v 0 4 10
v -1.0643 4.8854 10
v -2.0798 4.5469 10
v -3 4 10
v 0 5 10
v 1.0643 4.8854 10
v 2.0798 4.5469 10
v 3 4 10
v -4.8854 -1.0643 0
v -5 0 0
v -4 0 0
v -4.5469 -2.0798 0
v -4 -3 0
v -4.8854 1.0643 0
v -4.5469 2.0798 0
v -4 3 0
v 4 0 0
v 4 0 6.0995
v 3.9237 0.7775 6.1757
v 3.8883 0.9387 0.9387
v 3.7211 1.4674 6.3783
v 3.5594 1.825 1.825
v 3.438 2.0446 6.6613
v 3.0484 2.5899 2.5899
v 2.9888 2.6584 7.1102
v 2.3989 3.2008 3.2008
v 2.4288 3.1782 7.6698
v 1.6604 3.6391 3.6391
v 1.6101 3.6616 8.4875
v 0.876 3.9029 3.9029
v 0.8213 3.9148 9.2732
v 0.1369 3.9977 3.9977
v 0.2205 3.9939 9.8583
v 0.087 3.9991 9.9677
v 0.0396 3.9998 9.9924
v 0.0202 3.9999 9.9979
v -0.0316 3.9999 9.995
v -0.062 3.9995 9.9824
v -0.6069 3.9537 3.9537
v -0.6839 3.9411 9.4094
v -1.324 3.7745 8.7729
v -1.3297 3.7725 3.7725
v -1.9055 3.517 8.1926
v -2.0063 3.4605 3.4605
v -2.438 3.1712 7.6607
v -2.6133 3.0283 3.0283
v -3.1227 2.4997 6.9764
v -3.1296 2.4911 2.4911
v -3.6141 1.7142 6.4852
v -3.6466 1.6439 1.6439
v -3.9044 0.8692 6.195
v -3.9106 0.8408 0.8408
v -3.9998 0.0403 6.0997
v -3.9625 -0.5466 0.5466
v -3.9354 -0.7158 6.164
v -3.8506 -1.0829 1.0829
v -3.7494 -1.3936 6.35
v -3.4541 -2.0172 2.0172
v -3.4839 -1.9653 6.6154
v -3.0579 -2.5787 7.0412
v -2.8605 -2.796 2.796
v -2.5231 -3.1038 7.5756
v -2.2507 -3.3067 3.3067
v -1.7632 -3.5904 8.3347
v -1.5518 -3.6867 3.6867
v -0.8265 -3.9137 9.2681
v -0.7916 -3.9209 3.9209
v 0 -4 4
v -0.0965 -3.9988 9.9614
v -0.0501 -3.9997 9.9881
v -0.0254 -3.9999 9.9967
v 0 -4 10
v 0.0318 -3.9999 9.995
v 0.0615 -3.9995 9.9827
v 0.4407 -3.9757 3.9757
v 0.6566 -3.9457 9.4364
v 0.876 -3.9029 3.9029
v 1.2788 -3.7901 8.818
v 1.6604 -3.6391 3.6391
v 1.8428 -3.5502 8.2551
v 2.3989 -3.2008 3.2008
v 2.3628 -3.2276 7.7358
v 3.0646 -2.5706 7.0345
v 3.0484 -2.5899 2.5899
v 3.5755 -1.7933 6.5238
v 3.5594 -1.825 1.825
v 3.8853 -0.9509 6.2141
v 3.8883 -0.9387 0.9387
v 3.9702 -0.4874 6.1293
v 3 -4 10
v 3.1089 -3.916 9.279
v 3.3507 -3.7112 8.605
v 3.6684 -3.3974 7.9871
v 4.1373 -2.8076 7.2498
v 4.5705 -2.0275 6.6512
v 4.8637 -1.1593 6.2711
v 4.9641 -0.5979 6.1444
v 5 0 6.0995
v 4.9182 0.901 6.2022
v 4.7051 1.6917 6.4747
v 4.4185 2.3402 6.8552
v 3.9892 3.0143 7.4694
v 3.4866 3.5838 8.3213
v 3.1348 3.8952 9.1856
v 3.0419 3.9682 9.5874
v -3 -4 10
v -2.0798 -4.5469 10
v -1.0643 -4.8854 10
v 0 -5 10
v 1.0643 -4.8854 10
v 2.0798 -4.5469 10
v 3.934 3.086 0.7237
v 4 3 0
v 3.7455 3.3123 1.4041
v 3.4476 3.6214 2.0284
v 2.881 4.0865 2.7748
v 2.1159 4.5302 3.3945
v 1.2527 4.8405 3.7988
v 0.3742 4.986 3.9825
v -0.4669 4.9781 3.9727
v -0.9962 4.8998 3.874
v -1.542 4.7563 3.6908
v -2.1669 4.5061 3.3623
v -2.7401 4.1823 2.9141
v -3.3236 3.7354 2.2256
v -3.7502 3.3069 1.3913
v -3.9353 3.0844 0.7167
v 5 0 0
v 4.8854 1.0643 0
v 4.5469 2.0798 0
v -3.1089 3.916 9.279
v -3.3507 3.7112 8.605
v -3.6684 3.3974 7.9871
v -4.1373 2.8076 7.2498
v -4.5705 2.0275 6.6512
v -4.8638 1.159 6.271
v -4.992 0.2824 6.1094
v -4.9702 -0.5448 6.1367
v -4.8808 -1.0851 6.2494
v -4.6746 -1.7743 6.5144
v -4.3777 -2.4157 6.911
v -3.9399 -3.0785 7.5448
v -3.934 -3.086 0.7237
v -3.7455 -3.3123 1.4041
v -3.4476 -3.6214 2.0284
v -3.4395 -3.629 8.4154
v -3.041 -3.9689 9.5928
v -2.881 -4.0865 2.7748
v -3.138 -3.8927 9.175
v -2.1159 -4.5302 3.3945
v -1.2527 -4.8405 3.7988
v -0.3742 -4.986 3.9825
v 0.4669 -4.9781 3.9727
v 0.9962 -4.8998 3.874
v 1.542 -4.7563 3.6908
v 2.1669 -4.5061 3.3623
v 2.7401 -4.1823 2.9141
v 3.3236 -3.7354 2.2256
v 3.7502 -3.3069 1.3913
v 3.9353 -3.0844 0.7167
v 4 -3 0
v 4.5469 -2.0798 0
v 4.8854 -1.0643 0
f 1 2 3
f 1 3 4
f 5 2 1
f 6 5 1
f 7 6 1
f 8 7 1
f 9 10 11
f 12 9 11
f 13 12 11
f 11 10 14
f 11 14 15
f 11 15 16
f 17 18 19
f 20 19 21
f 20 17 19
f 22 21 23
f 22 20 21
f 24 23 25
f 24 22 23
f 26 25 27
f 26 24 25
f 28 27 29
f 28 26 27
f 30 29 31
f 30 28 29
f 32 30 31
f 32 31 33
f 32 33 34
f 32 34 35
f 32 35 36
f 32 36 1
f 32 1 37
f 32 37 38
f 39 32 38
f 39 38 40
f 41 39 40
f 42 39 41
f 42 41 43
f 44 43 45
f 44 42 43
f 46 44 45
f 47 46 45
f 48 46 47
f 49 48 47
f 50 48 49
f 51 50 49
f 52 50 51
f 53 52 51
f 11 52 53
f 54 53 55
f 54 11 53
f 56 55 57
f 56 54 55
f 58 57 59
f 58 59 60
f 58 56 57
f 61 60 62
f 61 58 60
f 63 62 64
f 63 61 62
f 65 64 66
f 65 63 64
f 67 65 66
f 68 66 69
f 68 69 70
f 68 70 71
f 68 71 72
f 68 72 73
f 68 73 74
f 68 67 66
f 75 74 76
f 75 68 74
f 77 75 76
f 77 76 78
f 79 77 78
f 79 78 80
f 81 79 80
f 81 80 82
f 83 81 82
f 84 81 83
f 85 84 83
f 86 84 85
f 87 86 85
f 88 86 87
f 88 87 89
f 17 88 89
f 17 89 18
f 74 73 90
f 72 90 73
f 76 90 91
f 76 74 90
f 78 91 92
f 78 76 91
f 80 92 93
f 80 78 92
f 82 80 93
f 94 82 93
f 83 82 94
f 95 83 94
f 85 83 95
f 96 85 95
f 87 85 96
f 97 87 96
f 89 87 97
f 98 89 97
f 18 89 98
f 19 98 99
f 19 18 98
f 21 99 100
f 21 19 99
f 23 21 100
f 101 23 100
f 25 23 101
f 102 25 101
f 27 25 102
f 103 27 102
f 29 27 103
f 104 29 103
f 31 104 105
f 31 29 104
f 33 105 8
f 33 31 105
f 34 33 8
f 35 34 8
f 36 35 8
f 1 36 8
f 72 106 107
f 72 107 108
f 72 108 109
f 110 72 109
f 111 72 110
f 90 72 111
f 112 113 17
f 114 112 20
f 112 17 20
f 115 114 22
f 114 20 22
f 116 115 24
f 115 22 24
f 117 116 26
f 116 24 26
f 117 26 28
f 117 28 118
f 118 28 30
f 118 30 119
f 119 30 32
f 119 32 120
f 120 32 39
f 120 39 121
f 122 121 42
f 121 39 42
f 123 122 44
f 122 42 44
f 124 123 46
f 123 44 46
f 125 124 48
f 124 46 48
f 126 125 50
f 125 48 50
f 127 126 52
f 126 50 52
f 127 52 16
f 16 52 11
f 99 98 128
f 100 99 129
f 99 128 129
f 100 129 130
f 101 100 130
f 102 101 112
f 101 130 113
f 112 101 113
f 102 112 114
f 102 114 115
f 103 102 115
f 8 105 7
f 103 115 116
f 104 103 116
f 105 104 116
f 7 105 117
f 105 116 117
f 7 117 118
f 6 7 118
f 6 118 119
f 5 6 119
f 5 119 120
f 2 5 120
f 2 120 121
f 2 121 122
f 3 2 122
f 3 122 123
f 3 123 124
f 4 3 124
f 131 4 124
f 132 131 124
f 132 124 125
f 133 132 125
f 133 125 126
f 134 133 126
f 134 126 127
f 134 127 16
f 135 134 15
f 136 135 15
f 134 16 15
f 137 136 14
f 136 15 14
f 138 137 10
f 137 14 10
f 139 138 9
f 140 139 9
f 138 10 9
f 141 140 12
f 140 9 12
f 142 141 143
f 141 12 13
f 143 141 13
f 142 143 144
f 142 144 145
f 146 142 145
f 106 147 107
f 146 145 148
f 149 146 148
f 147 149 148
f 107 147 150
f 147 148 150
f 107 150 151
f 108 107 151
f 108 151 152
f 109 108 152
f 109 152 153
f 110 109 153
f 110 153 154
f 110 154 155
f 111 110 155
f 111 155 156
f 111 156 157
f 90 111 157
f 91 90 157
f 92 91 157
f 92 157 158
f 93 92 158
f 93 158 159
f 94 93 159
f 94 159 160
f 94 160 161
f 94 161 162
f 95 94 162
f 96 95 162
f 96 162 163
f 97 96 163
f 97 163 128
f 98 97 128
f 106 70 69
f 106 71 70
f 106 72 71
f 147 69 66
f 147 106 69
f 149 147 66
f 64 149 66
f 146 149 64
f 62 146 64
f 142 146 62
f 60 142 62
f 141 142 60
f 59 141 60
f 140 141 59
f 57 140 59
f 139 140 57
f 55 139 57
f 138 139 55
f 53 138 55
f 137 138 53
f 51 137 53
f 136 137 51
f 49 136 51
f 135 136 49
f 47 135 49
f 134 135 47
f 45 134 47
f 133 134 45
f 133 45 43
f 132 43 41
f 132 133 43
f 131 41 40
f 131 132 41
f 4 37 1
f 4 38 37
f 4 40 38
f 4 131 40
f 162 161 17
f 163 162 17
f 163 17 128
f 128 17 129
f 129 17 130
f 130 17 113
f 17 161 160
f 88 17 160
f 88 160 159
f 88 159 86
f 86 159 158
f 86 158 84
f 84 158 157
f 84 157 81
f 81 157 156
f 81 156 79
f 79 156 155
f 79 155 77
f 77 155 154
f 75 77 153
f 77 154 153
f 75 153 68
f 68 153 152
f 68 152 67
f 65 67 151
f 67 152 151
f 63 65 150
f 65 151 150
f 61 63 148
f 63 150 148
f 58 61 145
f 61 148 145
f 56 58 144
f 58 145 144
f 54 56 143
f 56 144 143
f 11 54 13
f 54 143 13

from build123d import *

# Parameters (mm, degrees)
F0_R          = 5
F1_DEPTH      = 10
F3_DEPTH      = 5.001
F3_DEPTH_BACK = 5.001
F5_DEPTH      = 5.0010001
F5_DEPTH_BACK = 5.0010001
F6_R          = 4
F7_DEPTH      = 10.0010001


with BuildPart() as f1:
    # F0 (on Top) → F1 (new body)
    with BuildSketch(Plane.XY):
        Circle(F0_R)
    extrude(amount=F1_DEPTH)

    # F2 (on Front) → F3 (cut, two sides)
    with BuildSketch(Plane.XZ) as f3_sk:
        with BuildLine():
            ThreePointArc((4, 0), (0, 4), (-4, 0))
            Line((-4, 0), (4, 0))
        make_face()
    extrude(amount=-F3_DEPTH, mode=Mode.SUBTRACT)
    extrude(f3_sk.sketch, amount=F3_DEPTH_BACK, mode=Mode.SUBTRACT)

    # F4 (on Right) → F5 (cut, two sides)
    with BuildSketch(Plane.YZ) as f5_sk:
        with BuildLine():
            ThreePointArc((-4, 10), (0, 6.0994715953), (4, 10))
            Line((4, 10), (-4, 10))
        make_face()
    extrude(amount=-F5_DEPTH, mode=Mode.SUBTRACT)
    extrude(f5_sk.sketch, amount=F5_DEPTH_BACK, mode=Mode.SUBTRACT)

    # F6 (on Top) → F7 (cut, through all)
    with BuildSketch(Plane.XY):
        Circle(F6_R)
    extrude(amount=F7_DEPTH, mode=Mode.SUBTRACT)


solid = f1.part
